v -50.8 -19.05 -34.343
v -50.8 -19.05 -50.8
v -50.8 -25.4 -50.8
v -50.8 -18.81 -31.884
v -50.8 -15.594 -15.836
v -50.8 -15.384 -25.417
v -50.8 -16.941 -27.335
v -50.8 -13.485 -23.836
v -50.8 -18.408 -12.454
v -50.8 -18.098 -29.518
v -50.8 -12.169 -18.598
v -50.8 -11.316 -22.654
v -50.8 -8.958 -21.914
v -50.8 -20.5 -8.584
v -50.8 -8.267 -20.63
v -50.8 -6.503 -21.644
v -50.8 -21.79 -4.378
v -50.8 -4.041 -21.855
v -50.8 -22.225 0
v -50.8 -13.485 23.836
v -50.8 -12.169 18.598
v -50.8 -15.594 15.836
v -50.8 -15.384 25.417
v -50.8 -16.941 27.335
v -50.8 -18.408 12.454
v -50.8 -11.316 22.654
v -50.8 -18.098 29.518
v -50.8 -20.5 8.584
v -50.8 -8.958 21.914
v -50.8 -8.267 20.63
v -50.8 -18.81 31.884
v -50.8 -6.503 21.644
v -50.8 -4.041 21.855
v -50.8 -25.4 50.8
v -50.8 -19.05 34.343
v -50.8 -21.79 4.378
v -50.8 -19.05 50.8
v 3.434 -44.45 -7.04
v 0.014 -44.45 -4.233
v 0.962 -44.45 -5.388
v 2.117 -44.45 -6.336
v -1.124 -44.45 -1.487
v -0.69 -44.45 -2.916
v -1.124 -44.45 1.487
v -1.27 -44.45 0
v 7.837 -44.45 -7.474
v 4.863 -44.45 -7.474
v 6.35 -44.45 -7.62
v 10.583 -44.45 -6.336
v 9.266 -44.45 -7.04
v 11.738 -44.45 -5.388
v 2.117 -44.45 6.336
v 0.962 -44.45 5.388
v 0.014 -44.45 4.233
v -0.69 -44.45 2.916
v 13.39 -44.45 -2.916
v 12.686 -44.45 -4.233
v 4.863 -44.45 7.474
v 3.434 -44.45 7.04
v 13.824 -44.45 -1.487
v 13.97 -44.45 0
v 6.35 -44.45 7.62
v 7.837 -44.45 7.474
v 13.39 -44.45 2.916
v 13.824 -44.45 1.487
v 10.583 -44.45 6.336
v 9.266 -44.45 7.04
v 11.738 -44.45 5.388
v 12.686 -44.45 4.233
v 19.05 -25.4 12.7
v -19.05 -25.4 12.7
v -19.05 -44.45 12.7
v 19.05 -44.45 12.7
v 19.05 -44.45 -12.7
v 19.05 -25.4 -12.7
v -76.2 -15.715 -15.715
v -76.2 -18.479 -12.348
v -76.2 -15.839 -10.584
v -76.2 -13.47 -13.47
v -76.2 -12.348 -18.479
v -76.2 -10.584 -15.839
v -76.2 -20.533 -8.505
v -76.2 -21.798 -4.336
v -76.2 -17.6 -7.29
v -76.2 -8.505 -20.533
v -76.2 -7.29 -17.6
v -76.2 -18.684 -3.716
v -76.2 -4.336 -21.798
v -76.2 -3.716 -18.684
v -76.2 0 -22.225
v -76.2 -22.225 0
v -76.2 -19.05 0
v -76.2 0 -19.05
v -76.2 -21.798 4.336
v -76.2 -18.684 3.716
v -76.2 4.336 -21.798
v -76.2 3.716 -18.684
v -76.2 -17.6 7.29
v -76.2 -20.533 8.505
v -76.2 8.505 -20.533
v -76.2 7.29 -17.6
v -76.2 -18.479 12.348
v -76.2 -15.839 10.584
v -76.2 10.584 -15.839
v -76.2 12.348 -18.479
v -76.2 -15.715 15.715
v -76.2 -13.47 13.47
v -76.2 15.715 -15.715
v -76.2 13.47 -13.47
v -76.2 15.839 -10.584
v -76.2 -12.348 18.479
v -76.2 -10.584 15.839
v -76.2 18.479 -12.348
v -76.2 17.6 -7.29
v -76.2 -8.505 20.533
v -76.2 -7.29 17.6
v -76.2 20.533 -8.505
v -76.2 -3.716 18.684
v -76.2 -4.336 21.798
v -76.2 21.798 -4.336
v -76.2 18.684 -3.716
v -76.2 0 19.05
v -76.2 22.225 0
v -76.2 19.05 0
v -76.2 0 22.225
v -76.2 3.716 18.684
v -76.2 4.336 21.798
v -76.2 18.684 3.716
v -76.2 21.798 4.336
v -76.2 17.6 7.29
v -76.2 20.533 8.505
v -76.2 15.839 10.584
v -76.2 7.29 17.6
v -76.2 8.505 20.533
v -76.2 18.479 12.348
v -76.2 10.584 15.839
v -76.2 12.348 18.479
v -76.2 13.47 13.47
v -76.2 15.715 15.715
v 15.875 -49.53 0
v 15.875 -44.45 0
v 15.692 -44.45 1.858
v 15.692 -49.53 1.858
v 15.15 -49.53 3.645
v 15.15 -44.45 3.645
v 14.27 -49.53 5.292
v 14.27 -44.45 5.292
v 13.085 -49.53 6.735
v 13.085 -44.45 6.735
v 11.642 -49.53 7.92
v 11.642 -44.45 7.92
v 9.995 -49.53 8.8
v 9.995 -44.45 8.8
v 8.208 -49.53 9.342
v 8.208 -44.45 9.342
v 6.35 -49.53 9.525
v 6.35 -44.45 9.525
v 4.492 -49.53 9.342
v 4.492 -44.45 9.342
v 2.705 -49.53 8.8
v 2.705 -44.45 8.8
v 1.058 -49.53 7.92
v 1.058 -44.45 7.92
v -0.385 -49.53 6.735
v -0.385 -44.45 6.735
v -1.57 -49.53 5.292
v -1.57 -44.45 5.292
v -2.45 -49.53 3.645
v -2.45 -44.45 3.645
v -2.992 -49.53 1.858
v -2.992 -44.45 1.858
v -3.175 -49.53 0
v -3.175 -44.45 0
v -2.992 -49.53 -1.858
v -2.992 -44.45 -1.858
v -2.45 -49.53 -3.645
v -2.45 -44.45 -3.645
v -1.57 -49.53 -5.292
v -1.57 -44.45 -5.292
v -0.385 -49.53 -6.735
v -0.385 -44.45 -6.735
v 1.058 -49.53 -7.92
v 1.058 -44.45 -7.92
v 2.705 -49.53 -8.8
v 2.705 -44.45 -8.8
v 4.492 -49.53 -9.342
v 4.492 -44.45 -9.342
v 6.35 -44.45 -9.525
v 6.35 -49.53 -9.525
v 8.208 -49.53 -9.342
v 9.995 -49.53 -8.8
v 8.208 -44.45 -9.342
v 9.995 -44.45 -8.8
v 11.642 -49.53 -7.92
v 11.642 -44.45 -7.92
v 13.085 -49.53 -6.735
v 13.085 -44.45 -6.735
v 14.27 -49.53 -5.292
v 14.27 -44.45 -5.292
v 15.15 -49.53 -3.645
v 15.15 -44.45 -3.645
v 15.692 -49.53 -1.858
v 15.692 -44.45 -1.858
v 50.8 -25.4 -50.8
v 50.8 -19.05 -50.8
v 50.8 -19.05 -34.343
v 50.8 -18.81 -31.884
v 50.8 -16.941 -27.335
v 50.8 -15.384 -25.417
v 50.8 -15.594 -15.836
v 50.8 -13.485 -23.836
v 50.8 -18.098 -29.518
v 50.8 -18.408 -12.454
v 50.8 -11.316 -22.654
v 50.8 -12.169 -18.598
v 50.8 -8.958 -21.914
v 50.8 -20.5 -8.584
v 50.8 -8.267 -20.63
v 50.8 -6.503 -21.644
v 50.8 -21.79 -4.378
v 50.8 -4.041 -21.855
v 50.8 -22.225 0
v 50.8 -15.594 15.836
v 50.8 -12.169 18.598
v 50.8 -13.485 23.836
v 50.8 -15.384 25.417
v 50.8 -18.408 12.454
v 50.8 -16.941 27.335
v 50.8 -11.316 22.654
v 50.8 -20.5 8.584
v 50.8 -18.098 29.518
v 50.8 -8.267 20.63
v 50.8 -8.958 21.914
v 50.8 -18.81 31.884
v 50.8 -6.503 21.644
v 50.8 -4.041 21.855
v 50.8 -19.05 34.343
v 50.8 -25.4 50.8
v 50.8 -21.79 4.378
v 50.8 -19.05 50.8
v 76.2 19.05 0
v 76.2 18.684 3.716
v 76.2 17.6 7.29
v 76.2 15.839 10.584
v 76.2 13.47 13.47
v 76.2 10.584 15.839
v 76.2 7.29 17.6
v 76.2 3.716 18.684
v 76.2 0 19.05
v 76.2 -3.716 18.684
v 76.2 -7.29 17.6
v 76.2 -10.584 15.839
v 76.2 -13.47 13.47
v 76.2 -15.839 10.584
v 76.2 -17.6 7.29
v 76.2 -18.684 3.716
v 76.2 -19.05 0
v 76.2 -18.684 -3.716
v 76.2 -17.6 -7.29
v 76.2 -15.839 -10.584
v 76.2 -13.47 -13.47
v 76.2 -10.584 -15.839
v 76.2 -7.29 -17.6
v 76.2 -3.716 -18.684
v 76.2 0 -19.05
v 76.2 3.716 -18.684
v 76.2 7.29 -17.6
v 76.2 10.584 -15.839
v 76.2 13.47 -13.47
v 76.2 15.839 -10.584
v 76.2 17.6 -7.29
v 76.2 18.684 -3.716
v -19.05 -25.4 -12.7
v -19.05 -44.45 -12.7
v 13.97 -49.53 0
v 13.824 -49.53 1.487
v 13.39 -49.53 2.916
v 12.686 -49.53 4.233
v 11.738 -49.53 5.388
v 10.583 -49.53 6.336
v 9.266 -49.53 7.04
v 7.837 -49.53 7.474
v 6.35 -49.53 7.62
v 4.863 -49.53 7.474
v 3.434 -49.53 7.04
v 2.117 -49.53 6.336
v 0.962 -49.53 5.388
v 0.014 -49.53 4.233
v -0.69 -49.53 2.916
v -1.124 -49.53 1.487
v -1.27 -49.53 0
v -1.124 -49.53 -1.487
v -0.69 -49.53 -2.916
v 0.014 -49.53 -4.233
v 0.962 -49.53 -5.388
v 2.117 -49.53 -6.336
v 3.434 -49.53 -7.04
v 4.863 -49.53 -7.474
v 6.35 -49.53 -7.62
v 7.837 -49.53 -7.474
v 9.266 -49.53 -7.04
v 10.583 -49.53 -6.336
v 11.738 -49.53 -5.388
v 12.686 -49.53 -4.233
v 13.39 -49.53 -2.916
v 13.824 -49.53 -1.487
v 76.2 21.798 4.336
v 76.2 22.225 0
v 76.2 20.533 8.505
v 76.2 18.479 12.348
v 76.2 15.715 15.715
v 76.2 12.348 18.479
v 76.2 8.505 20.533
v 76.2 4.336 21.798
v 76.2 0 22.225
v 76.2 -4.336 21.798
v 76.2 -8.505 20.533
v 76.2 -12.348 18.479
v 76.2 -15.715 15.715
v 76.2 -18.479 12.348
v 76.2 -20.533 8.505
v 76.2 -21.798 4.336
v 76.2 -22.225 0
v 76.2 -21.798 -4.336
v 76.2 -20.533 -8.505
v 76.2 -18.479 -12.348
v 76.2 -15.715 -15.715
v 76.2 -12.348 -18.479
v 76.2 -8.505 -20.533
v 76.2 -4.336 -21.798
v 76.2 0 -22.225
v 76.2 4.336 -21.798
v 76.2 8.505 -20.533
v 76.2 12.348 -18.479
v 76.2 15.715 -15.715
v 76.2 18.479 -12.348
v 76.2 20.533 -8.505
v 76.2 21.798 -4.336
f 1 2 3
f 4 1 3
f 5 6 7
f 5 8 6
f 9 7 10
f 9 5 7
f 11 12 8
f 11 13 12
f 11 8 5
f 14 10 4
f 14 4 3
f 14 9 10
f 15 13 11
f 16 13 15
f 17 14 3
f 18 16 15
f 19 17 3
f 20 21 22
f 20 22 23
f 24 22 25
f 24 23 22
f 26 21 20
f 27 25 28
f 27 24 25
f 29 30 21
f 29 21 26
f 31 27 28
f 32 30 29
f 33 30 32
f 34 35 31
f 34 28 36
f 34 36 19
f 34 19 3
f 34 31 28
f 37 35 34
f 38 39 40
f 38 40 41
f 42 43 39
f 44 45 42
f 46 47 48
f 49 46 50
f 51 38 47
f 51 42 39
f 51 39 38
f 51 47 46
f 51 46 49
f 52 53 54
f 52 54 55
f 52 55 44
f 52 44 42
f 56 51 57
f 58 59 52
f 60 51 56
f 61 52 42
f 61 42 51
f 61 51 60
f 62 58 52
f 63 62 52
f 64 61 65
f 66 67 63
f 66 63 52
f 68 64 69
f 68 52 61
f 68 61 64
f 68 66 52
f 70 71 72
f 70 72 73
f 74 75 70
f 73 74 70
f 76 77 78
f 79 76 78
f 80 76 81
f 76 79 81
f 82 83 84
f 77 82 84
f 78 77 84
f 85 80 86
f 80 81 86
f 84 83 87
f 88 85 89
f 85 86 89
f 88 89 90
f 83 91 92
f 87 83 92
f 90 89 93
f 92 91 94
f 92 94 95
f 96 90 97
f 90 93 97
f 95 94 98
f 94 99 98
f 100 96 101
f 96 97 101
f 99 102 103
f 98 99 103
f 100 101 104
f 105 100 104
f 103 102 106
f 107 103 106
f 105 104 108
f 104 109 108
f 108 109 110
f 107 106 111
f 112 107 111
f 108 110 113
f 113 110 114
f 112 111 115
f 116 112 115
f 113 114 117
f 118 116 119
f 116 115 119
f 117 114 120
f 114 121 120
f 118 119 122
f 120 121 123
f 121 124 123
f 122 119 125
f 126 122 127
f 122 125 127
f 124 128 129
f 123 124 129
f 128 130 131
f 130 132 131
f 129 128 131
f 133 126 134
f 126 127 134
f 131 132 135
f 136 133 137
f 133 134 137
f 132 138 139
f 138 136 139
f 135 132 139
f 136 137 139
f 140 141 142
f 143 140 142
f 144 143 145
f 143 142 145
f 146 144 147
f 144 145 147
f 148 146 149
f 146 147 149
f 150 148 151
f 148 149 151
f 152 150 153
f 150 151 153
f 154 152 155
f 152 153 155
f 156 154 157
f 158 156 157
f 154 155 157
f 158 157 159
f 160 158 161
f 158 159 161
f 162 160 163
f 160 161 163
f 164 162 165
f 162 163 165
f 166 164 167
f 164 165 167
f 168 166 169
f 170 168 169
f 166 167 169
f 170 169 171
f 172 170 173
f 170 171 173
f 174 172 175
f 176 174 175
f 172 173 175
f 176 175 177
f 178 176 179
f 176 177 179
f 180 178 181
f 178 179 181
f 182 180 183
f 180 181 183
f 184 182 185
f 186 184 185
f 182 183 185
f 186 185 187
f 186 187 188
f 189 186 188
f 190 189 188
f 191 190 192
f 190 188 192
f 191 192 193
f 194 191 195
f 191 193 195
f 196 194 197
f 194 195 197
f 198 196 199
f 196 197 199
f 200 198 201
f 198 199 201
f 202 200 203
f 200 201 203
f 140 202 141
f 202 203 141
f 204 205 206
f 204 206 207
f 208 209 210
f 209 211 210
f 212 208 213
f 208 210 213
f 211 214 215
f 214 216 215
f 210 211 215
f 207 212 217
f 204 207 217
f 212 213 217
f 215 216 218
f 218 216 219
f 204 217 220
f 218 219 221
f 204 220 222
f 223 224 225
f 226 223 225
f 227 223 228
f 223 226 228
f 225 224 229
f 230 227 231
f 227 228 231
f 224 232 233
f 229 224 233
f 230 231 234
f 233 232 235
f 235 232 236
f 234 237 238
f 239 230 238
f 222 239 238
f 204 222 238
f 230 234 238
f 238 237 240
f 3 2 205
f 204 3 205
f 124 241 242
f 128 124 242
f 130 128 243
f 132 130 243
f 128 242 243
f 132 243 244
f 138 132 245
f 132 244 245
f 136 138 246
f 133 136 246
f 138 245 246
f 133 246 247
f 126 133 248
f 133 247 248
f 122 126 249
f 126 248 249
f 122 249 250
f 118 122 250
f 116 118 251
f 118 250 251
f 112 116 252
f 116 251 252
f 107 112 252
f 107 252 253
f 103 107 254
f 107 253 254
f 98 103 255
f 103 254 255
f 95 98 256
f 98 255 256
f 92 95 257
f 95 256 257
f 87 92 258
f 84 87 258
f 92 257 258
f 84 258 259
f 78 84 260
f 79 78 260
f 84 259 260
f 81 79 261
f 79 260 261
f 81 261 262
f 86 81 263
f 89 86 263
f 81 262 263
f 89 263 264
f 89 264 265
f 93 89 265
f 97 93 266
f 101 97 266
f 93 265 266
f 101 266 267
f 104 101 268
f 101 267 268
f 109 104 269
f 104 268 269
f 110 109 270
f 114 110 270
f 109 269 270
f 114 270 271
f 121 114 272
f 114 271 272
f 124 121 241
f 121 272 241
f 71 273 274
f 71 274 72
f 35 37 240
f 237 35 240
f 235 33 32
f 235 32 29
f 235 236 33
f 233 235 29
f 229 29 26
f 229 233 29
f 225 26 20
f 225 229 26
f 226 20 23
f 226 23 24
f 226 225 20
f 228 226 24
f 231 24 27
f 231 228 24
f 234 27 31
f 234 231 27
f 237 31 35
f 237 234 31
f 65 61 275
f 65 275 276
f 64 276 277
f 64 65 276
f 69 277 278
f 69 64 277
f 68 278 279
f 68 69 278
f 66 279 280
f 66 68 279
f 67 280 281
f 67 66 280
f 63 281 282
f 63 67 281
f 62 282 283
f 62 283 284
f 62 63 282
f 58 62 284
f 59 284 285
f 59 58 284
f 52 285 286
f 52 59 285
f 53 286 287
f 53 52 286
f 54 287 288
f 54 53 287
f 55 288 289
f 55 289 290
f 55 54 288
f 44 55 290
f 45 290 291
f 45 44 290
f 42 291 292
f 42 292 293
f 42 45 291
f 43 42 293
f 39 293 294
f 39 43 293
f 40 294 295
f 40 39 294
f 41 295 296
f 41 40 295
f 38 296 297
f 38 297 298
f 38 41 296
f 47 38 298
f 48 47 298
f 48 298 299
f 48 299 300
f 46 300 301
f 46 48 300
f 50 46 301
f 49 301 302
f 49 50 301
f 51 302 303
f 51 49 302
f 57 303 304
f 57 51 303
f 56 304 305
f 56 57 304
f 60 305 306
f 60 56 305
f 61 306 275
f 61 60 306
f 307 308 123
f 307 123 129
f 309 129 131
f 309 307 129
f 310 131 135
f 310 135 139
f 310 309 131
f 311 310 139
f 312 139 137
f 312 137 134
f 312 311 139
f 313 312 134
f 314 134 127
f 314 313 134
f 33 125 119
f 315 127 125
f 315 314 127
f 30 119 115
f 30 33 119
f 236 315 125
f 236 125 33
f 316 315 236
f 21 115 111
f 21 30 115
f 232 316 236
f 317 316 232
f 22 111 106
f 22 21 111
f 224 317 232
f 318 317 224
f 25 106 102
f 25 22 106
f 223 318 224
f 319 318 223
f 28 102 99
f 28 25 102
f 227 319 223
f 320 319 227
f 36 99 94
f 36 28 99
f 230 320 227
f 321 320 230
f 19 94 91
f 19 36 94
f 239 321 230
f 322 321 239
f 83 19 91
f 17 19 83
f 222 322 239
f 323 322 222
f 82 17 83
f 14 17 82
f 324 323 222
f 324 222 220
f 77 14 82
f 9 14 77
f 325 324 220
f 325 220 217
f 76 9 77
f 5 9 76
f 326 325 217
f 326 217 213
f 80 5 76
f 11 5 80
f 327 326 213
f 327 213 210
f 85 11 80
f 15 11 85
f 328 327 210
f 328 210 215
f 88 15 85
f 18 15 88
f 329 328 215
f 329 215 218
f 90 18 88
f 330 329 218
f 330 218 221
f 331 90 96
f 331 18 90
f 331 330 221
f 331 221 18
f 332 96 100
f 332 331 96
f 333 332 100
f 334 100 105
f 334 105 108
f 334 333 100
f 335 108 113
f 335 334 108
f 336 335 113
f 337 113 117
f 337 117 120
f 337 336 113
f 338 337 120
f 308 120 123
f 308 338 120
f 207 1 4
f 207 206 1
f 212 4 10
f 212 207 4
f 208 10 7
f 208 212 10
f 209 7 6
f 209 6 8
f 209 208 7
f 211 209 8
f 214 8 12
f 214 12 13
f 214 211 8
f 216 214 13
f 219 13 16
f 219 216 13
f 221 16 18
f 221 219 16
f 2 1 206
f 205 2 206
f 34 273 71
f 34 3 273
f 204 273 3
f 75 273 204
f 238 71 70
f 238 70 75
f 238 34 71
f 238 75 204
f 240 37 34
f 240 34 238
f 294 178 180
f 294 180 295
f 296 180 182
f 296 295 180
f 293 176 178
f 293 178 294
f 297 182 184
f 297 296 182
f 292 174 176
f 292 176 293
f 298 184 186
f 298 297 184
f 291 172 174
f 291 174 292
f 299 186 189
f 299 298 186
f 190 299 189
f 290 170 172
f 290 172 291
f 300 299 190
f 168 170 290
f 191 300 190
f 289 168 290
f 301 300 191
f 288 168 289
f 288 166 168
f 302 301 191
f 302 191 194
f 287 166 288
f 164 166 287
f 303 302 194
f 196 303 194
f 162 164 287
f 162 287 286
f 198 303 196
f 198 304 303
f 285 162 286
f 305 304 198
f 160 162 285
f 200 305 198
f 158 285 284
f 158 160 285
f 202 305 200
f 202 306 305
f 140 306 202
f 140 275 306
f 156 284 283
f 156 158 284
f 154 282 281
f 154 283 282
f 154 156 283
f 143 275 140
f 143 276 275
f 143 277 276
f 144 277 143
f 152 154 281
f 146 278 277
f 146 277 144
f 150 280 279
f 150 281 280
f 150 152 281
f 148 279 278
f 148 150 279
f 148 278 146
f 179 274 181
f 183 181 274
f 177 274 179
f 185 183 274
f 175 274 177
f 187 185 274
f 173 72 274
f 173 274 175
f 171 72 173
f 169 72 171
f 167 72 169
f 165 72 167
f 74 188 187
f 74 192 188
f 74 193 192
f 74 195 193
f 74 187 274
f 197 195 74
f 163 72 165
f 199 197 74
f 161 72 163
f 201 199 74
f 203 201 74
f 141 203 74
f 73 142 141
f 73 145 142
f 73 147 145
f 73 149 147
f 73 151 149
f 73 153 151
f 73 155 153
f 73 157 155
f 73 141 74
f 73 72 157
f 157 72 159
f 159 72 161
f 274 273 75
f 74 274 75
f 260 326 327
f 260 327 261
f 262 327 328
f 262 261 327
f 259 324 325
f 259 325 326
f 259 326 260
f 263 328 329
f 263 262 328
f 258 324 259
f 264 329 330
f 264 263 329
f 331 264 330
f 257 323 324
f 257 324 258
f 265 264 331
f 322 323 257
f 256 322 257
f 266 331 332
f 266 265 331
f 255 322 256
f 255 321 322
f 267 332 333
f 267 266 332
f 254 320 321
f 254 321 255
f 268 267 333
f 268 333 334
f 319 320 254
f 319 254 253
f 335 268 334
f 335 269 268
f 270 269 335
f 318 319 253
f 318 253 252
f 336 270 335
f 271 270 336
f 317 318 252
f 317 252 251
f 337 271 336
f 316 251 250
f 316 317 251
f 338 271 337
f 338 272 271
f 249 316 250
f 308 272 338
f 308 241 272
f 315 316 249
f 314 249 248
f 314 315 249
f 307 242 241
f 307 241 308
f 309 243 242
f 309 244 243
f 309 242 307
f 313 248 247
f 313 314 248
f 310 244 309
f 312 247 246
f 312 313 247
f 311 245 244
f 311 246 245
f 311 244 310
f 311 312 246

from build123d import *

# Parameters (mm, degrees)
F0_R          = 22.225
F1_DEPTH      = 76.2
F1_DEPTH_BACK = 76.2
F3_START      = 19.05
F2_W          = 101.6
F2_H          = 101.6
F3_DEPTH      = 6.35
F4_R          = 12.7
F5_W          = 38.1
F5_H          = 25.4
F6_DEPTH      = 19.05
F7_R          = 9.525
F7_R_2        = 7.62
F8_DEPTH      = 5.08
F9_R          = 19.05
F10_DEPTH     = 152.4


with BuildPart() as f1:
    # F0 (on Right) → F1 (new body, two sides)
    with BuildSketch(Plane.YZ) as f1_sk:
        Circle(F0_R)
    extrude(amount=F1_DEPTH)
    extrude(f1_sk.sketch, amount=-F1_DEPTH_BACK)

    # F2 (on Front) → F3 (join)
    with BuildSketch(Plane.XZ.offset(F3_START)):
        Rectangle(F2_W, F2_H)
    extrude(amount=F3_DEPTH)

    # F4
    f4_edges = [f1.edges().sort_by_distance(p)[0] for p in [
        (0, -19.05, 11.447625),
        (0, -19.05, -11.447625),
    ]]
    fillet(f4_edges, radius=F4_R)

    # F5 (on face) → F6 (join)
    with BuildSketch(Plane.XZ.offset(25.4)):
        Rectangle(F5_W, F5_H)
    extrude(amount=F6_DEPTH)

    # F7 (on face) → F8 (join)
    with BuildSketch(Plane.XZ.offset(44.45)):
        with Locations((6.35, 0)):
            Circle(F7_R)
        with Locations((6.35, 0)):
            Circle(F7_R_2, mode=Mode.SUBTRACT)
    extrude(amount=F8_DEPTH)

    # F9 (on face) → F10 (cut)
    with BuildSketch(Plane.YZ.offset(76.2)):
        Circle(F9_R)
    extrude(amount=-F10_DEPTH, mode=Mode.SUBTRACT)


solid = f1.part
